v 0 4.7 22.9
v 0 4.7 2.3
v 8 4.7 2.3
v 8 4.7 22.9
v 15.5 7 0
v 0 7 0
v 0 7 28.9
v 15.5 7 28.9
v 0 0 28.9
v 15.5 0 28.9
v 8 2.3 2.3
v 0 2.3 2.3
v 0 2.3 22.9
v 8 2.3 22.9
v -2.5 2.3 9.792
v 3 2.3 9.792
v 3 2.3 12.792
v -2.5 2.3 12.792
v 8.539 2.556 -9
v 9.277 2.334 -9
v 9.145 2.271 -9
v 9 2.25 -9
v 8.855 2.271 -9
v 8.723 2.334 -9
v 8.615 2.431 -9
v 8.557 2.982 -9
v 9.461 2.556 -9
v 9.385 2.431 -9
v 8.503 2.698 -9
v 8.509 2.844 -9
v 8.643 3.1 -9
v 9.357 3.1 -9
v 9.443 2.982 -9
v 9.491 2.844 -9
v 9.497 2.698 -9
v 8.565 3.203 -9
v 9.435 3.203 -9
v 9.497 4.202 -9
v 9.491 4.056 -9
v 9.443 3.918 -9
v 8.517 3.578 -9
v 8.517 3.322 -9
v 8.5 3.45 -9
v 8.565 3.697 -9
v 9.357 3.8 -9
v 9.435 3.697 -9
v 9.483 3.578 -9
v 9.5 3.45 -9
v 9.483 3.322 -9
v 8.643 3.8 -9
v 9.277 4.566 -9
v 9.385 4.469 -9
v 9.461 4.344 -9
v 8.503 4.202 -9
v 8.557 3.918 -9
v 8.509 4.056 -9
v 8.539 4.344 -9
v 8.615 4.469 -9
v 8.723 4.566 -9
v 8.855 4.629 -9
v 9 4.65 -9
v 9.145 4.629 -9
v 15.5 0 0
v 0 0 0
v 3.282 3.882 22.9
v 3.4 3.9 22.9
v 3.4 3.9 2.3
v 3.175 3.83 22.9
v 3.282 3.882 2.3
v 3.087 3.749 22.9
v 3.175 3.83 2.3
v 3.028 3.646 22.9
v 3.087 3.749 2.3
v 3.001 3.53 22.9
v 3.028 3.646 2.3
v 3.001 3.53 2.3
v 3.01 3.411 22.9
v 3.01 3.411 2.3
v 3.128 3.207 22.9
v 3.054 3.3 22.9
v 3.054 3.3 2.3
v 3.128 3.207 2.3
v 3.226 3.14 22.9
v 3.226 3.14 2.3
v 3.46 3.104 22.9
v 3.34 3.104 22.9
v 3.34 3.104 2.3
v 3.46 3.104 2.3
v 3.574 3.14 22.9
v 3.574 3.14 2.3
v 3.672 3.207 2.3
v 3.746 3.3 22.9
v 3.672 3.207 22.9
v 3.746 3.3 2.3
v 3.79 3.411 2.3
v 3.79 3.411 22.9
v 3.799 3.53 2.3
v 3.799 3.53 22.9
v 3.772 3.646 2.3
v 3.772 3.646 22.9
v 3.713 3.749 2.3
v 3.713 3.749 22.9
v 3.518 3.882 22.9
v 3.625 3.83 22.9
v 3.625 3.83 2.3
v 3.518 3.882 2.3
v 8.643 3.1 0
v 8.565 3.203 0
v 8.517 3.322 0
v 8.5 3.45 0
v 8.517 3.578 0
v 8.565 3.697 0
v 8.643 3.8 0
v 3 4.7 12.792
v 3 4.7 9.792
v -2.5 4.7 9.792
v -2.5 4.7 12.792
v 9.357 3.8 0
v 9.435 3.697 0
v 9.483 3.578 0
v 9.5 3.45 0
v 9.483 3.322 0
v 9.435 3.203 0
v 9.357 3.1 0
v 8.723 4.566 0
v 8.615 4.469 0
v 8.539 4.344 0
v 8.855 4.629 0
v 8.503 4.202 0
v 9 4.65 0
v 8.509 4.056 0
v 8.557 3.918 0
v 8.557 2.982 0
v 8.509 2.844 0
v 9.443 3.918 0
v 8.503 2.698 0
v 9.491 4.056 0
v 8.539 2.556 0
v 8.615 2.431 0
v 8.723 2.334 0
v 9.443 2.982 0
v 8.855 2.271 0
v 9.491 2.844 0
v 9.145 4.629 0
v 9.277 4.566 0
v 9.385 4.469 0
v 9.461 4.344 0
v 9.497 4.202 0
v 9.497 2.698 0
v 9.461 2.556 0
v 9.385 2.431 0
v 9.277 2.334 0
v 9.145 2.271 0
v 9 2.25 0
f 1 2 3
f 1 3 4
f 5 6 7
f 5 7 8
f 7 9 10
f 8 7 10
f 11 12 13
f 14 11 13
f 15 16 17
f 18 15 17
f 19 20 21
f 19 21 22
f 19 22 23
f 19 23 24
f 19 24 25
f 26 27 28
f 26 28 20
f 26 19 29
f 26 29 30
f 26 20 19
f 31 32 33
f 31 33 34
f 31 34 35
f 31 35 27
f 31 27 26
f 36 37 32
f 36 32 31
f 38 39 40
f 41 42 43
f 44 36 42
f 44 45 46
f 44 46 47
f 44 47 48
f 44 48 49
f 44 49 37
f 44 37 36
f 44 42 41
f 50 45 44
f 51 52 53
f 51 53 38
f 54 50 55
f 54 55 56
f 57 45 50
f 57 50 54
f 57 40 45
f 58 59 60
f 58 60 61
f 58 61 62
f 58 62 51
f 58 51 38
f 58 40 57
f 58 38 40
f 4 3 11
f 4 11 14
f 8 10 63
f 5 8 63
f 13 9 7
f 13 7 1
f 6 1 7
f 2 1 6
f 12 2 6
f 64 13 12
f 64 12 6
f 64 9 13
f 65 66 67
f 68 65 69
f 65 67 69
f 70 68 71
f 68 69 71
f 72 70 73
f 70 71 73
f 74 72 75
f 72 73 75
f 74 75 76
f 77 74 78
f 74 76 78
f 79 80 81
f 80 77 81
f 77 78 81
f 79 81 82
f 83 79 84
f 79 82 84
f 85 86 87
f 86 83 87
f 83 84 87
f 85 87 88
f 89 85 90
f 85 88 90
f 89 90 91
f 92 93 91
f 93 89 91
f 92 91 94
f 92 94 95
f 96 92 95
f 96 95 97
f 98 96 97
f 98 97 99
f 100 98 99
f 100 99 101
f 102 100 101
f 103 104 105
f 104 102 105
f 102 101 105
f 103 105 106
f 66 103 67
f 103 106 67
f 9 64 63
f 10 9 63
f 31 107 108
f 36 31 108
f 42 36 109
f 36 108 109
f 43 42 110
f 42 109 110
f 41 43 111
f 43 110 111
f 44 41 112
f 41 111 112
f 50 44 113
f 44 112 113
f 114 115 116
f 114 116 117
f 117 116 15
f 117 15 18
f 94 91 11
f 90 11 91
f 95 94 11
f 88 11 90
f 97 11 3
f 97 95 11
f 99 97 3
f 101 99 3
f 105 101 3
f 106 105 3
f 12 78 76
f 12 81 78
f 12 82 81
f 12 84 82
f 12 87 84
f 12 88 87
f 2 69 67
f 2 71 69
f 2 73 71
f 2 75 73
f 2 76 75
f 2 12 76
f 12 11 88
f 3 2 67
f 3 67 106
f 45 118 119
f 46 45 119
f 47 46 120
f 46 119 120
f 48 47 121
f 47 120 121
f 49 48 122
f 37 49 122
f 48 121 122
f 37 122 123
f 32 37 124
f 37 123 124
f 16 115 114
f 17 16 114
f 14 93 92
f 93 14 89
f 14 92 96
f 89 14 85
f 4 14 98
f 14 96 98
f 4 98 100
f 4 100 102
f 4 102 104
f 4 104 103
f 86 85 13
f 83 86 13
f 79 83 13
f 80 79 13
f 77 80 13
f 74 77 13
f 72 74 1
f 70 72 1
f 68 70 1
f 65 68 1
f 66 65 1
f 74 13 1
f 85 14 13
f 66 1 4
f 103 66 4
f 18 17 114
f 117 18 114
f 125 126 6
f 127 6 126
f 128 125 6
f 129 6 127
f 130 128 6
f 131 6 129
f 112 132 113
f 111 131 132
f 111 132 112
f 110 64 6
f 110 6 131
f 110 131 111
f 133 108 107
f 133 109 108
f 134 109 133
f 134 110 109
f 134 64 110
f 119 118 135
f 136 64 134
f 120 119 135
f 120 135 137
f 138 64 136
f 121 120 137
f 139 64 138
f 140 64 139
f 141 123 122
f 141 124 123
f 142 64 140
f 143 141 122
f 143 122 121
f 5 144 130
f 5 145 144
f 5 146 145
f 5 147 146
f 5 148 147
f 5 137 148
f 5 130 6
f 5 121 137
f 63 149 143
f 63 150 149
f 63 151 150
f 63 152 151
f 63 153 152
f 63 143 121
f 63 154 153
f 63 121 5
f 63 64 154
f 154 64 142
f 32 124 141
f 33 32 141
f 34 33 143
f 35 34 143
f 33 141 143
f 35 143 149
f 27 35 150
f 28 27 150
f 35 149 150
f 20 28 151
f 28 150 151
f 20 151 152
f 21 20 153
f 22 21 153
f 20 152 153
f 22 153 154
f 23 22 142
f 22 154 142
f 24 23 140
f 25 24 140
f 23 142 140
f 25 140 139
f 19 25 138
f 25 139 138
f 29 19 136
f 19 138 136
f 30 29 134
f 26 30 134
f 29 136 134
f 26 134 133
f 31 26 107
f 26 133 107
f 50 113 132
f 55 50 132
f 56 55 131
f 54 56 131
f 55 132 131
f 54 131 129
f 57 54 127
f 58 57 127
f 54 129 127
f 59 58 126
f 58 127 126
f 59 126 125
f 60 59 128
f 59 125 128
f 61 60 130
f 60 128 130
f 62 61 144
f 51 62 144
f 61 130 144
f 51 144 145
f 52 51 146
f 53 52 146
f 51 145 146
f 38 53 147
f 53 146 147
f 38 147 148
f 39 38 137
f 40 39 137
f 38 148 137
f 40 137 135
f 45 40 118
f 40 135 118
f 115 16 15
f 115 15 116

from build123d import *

# Parameters (mm, degrees)
ESQUISSE1_W             = 15.5
ESQUISSE1_H             = 28.9
BOSS_EXTRU_1_DEPTH      = 7
ESQUISSE2_W             = 20.6
ESQUISSE2_H             = 2.4
ENL_V_MAT_EXTRU_1_DEPTH = 8
BOSS_EXTRU_2_REACH      = 33.572
ESQUISSE3_R             = 0.4
ESQUISSE4_W             = 3
ESQUISSE4_H             = 2.4
BOSS_EXTRU_4_DEPTH      = 5.5
ESQUISSE6_R             = 0.5
BOSS_EXTRU_5_DEPTH      = 9


with BuildPart() as part:
    # Esquisse1 → Boss.-Extru.1 (new body)
    with BuildSketch(Plane(origin=(0, 0, 0), x_dir=(1, 0, 0), z_dir=(0, 1, 0))):
        with Locations((7.75, -14.45)):
            Rectangle(ESQUISSE1_W, ESQUISSE1_H)
    extrude(amount=BOSS_EXTRU_1_DEPTH)

    # Esquisse2 → Enlèv. mat.-Extru.1 (cut)
    with BuildSketch(Plane.ZY):
        with Locations((12.6, 3.5)):
            Rectangle(ESQUISSE2_W, ESQUISSE2_H)
    extrude(amount=-ENL_V_MAT_EXTRU_1_DEPTH, mode=Mode.SUBTRACT)

    # Esquisse3 → Boss.-Extru.2 (add, up to next)
    with BuildSketch(Plane.XY.offset(2.3), mode=Mode.PRIVATE) as boss_extru_2_sk1:
        with Locations(Location((3.4, 3.5, 0), (0, 0, 90))):
            Circle(ESQUISSE3_R)
    boss_extru_2_tool1 = extrude(boss_extru_2_sk1.sketch, amount=BOSS_EXTRU_2_REACH, mode=Mode.PRIVATE) - part.part
    add(boss_extru_2_tool1.solids().sort_by_distance((3.4, 3.5, 2.3))[0])

    # Esquisse6 → Boss.-Extru.5 (add)
    with BuildSketch(Plane(origin=(0, 0, 0), x_dir=(-1, 0, 0), z_dir=(0, 0, -1))):
        with Locations((-9, 4.15)):
            Circle(ESQUISSE6_R)
        with Locations((-9, 3.45)):
            Circle(ESQUISSE6_R)
        with Locations((-9, 2.75)):
            Circle(ESQUISSE6_R)
    extrude(amount=BOSS_EXTRU_5_DEPTH)


with BuildPart() as body_2:
    # Esquisse4 → Boss.-Extru.4 (new body)
    with BuildSketch(Plane.ZY.offset(-3)):
        with Locations((11.292047873, 3.5)):
            Rectangle(ESQUISSE4_W, ESQUISSE4_H)
    extrude(amount=BOSS_EXTRU_4_DEPTH)


solid = Compound([part.part, body_2.part])
